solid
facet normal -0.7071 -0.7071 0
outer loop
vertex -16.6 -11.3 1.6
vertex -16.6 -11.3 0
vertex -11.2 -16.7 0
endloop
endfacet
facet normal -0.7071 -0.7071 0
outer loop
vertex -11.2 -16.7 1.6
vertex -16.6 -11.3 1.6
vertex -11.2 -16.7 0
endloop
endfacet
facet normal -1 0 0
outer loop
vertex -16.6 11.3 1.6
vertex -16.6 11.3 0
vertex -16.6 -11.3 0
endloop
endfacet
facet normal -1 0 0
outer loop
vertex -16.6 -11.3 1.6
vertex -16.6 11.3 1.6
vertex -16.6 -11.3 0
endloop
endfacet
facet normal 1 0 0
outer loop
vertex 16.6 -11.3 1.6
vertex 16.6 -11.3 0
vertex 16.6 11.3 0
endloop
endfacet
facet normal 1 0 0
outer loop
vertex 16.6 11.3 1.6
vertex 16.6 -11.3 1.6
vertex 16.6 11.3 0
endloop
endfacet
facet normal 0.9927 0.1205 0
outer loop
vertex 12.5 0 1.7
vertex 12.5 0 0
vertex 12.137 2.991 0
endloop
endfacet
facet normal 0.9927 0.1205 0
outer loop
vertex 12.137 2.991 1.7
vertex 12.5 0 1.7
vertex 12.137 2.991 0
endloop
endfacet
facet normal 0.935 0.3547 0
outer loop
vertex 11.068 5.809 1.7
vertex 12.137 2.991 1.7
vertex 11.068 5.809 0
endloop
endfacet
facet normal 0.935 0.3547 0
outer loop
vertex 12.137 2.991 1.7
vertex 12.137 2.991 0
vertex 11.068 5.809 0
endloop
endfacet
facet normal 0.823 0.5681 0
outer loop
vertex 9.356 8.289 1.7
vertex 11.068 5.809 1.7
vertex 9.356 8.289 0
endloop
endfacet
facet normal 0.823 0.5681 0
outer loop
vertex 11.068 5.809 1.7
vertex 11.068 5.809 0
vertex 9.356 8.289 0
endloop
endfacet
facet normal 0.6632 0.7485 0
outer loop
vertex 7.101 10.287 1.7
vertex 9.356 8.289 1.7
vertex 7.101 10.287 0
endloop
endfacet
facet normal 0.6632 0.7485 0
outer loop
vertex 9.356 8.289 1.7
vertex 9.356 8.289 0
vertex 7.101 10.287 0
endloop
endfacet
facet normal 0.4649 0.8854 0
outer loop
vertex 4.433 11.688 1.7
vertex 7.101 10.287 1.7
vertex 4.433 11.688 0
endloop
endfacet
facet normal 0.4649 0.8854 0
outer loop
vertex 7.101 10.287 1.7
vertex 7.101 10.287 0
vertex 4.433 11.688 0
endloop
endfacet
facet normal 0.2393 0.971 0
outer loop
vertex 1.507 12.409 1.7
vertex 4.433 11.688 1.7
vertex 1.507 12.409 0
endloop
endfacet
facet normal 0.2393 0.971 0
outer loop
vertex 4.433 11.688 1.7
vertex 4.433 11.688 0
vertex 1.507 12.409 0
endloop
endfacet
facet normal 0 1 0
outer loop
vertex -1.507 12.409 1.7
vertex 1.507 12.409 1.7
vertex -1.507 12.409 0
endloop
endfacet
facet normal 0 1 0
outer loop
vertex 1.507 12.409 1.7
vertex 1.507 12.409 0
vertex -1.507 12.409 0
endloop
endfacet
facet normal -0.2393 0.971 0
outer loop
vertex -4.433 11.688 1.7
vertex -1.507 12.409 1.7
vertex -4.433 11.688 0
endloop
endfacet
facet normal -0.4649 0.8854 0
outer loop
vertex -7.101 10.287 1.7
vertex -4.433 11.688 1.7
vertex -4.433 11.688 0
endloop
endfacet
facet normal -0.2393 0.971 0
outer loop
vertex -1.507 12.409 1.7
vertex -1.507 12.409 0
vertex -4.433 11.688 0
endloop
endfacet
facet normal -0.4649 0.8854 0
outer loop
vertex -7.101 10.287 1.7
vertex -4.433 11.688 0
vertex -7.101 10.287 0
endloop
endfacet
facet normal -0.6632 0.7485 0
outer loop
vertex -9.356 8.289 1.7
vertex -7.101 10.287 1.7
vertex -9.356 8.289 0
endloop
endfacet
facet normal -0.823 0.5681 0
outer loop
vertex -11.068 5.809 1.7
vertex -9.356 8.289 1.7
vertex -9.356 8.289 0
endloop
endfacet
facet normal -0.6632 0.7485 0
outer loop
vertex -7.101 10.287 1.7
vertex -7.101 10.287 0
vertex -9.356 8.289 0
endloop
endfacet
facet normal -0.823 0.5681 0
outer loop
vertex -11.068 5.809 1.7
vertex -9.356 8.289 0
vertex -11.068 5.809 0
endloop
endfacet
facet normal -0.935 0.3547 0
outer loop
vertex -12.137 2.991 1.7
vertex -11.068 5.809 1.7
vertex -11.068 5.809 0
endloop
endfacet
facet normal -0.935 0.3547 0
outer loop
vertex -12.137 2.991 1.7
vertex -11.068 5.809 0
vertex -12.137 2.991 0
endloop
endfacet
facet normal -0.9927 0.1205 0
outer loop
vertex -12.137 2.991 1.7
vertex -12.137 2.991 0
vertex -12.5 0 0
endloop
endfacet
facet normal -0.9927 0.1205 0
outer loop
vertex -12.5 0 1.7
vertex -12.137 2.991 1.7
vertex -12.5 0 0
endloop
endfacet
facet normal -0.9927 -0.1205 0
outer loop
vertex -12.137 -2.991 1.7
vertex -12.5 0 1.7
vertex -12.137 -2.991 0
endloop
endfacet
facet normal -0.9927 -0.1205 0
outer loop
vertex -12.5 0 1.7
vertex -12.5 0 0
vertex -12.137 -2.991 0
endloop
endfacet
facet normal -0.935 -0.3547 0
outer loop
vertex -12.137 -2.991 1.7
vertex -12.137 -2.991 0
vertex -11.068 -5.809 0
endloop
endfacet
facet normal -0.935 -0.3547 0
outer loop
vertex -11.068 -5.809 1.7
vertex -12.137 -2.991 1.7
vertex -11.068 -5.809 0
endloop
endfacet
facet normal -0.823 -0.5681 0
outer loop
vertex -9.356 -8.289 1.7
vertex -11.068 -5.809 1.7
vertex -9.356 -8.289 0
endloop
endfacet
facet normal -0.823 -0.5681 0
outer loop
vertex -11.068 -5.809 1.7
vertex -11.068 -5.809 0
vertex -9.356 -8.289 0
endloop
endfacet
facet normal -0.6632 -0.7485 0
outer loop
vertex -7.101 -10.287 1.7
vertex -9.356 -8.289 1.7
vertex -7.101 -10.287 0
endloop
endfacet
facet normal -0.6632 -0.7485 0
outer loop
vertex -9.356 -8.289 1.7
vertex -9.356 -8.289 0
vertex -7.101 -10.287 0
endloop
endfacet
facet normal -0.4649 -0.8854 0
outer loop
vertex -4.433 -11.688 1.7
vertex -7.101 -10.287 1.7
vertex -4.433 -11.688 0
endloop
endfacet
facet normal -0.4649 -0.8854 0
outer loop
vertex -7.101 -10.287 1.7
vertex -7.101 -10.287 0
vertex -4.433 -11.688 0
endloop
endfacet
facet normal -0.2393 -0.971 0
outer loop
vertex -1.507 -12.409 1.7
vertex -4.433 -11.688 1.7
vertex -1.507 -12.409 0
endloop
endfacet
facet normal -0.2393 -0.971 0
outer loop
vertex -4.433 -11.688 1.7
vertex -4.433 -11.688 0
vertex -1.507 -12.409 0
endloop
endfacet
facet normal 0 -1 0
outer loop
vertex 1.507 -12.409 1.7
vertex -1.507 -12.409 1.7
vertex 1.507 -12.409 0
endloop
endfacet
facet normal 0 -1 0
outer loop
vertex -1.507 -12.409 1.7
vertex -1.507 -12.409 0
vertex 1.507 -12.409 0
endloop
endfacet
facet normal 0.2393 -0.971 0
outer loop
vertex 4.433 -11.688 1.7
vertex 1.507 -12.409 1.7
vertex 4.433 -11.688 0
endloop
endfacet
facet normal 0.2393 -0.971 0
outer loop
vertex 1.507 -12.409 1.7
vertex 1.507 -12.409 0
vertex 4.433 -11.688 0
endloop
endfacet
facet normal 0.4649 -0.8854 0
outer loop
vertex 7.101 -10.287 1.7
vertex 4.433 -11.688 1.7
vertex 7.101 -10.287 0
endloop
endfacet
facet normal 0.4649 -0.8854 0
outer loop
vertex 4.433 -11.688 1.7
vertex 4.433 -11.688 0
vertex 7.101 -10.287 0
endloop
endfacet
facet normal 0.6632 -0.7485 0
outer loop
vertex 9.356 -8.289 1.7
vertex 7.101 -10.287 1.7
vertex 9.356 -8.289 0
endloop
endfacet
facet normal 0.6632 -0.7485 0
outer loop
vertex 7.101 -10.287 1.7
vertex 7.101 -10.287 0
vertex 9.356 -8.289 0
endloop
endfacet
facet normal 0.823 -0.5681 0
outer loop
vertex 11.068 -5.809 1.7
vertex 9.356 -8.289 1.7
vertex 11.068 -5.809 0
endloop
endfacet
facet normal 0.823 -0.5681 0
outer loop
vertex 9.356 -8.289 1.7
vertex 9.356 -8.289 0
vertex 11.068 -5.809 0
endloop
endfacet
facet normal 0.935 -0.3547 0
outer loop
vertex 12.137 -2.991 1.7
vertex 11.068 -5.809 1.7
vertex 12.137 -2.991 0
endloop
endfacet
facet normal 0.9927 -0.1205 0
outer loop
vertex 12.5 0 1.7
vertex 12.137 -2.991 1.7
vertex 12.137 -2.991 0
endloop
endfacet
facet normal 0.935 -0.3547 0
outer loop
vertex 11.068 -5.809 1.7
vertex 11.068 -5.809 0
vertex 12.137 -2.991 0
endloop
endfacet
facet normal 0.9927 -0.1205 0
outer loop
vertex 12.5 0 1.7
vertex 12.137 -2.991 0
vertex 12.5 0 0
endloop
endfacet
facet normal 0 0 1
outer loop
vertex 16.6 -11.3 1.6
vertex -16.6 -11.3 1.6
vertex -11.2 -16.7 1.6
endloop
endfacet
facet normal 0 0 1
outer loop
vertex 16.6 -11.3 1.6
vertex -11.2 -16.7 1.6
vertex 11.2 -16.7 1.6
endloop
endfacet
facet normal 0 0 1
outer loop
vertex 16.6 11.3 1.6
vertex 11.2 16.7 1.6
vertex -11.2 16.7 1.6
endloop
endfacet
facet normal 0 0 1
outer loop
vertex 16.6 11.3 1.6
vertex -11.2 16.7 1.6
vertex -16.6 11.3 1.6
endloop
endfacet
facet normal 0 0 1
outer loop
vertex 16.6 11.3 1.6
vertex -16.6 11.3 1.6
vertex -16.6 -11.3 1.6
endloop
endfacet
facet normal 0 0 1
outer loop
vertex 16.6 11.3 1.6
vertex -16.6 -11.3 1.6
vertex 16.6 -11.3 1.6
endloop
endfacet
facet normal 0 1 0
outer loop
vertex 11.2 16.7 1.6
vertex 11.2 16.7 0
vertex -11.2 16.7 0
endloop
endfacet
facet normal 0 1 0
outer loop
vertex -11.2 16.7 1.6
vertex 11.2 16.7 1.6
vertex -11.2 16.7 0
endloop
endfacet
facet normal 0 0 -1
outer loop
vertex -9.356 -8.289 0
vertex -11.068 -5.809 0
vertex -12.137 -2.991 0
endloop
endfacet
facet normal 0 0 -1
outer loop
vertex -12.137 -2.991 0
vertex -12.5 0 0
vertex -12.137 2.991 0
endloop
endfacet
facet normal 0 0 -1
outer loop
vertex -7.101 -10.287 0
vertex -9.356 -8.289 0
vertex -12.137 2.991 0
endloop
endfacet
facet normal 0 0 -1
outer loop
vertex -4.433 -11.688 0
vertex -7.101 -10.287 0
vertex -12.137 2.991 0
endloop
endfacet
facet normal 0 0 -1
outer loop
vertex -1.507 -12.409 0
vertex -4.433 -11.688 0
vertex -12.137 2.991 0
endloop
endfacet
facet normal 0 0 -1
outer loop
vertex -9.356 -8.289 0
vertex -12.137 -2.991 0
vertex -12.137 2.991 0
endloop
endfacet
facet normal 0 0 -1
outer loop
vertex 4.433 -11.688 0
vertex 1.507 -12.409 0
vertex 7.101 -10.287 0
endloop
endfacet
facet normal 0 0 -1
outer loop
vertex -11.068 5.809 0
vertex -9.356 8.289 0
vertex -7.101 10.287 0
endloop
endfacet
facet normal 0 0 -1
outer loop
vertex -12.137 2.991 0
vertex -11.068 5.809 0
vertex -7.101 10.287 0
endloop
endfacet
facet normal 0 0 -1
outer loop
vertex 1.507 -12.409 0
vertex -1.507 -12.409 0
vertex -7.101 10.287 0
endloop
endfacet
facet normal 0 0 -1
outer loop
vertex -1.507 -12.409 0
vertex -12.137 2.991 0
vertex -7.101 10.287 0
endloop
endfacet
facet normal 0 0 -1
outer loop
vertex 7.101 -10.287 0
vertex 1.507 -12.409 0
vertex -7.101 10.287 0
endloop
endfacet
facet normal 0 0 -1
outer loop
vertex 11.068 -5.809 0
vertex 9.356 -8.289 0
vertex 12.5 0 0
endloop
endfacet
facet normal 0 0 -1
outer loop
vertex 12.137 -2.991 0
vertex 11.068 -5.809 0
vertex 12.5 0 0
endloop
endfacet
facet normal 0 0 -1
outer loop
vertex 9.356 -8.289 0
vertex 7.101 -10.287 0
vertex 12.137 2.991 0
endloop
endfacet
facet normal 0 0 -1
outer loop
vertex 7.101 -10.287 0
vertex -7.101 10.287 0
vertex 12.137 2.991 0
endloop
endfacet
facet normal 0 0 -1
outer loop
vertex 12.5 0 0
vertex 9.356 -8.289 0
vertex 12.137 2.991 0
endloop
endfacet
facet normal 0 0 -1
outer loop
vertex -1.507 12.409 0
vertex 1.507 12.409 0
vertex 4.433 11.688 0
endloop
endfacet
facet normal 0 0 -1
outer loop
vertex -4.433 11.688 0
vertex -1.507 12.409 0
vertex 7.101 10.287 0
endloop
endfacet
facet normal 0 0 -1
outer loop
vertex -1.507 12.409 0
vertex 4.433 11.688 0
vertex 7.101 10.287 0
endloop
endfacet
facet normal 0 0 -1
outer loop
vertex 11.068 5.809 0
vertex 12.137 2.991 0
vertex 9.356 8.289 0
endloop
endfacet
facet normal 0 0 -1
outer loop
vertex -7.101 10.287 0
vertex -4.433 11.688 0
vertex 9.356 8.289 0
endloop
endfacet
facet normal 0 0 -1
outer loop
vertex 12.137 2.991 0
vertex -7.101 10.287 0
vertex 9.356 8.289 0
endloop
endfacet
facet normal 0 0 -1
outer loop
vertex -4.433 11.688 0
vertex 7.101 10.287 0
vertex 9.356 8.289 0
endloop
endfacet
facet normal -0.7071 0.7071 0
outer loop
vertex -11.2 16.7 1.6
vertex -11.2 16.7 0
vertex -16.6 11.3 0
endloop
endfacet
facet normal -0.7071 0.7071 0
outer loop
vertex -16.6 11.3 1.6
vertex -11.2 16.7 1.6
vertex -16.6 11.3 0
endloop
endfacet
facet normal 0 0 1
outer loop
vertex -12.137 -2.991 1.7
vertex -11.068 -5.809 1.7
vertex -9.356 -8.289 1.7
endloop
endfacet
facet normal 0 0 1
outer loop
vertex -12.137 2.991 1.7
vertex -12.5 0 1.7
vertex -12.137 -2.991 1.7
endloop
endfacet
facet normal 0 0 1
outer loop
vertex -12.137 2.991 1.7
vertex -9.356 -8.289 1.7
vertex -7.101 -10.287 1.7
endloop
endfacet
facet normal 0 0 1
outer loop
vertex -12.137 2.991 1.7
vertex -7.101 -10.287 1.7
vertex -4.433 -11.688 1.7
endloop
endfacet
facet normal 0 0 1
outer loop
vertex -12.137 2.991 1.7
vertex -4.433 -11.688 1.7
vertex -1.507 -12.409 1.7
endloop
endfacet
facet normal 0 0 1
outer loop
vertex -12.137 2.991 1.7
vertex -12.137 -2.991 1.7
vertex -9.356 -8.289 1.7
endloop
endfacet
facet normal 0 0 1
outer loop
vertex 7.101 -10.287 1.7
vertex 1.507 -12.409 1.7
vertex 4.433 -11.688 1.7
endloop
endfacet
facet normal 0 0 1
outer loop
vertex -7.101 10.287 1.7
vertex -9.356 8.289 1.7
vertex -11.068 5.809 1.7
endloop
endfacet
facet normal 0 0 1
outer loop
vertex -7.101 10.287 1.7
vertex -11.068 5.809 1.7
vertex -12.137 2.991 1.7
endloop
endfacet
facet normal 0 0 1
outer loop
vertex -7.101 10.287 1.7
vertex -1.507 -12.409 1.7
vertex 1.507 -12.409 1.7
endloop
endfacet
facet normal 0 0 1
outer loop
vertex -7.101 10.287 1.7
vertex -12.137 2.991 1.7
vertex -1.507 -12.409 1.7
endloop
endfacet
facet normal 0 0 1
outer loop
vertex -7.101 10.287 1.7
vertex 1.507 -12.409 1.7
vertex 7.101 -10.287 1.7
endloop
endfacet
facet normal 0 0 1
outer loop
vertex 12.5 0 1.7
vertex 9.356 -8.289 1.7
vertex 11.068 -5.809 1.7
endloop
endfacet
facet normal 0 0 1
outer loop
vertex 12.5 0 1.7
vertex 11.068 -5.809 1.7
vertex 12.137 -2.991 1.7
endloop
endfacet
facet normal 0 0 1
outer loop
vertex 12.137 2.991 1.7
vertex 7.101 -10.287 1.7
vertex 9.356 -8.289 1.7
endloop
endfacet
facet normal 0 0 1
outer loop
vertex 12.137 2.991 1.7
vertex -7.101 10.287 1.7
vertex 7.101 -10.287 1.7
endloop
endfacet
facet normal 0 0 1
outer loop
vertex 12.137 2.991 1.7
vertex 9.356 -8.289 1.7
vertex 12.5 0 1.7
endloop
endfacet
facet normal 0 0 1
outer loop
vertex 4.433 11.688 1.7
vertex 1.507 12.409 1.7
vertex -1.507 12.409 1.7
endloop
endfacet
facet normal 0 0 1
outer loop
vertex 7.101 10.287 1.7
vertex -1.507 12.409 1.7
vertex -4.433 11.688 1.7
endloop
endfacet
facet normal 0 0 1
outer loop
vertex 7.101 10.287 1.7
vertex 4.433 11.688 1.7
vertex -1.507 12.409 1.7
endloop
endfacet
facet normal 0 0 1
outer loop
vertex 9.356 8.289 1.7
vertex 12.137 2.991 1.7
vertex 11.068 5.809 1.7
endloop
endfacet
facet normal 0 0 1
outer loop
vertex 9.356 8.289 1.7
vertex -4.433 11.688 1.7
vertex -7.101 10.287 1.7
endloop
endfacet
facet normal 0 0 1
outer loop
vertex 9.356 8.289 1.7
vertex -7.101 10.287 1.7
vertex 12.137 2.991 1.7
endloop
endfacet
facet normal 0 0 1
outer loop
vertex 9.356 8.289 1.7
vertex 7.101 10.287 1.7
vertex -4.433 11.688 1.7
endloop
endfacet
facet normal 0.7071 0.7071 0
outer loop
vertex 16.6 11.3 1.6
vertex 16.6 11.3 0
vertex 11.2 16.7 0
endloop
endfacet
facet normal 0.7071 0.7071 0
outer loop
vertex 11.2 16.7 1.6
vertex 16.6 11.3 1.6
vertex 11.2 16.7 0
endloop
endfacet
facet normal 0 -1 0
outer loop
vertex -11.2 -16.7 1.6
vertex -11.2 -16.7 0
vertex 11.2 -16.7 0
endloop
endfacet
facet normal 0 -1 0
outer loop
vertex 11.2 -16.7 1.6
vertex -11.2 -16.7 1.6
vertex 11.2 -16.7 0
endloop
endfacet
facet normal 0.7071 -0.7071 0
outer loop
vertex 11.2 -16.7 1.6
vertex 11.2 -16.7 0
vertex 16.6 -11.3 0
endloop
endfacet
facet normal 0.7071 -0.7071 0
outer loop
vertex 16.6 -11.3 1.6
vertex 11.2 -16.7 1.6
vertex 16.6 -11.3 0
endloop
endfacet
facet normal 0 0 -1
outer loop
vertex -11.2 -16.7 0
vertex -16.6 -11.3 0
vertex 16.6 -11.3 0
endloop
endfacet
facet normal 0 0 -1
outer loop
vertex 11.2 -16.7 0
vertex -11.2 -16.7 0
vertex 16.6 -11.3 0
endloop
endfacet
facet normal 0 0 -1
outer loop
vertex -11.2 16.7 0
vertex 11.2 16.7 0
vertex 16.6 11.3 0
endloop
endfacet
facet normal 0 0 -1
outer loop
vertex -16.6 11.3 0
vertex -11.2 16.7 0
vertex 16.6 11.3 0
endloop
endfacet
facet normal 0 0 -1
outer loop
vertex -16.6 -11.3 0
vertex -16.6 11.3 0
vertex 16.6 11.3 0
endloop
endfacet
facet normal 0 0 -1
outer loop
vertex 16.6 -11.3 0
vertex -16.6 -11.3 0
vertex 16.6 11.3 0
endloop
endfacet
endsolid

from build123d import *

# Parameters (mm, degrees)
F1_DEPTH = 1.6
F2_R     = 12.5
F3_DEPTH = 1.7


with BuildPart() as f1:
    # F0 (on Top) → F1 (new body)
    with BuildSketch(Plane.XY):
        Polygon((11.2, 16.7), (-11.2, 16.7), (-16.6, 11.3), (-16.6, -11.3), (-11.2, -16.7), (11.2, -16.7), (16.6, -11.3), (16.6, 11.3), align=None)
    extrude(amount=F1_DEPTH)


with BuildPart() as f3:
    # F2 (on Top) → F3 (new body)
    with BuildSketch(Plane.XY):
        Circle(F2_R)
    extrude(amount=F3_DEPTH)


solid = Compound([f1.part, f3.part])
